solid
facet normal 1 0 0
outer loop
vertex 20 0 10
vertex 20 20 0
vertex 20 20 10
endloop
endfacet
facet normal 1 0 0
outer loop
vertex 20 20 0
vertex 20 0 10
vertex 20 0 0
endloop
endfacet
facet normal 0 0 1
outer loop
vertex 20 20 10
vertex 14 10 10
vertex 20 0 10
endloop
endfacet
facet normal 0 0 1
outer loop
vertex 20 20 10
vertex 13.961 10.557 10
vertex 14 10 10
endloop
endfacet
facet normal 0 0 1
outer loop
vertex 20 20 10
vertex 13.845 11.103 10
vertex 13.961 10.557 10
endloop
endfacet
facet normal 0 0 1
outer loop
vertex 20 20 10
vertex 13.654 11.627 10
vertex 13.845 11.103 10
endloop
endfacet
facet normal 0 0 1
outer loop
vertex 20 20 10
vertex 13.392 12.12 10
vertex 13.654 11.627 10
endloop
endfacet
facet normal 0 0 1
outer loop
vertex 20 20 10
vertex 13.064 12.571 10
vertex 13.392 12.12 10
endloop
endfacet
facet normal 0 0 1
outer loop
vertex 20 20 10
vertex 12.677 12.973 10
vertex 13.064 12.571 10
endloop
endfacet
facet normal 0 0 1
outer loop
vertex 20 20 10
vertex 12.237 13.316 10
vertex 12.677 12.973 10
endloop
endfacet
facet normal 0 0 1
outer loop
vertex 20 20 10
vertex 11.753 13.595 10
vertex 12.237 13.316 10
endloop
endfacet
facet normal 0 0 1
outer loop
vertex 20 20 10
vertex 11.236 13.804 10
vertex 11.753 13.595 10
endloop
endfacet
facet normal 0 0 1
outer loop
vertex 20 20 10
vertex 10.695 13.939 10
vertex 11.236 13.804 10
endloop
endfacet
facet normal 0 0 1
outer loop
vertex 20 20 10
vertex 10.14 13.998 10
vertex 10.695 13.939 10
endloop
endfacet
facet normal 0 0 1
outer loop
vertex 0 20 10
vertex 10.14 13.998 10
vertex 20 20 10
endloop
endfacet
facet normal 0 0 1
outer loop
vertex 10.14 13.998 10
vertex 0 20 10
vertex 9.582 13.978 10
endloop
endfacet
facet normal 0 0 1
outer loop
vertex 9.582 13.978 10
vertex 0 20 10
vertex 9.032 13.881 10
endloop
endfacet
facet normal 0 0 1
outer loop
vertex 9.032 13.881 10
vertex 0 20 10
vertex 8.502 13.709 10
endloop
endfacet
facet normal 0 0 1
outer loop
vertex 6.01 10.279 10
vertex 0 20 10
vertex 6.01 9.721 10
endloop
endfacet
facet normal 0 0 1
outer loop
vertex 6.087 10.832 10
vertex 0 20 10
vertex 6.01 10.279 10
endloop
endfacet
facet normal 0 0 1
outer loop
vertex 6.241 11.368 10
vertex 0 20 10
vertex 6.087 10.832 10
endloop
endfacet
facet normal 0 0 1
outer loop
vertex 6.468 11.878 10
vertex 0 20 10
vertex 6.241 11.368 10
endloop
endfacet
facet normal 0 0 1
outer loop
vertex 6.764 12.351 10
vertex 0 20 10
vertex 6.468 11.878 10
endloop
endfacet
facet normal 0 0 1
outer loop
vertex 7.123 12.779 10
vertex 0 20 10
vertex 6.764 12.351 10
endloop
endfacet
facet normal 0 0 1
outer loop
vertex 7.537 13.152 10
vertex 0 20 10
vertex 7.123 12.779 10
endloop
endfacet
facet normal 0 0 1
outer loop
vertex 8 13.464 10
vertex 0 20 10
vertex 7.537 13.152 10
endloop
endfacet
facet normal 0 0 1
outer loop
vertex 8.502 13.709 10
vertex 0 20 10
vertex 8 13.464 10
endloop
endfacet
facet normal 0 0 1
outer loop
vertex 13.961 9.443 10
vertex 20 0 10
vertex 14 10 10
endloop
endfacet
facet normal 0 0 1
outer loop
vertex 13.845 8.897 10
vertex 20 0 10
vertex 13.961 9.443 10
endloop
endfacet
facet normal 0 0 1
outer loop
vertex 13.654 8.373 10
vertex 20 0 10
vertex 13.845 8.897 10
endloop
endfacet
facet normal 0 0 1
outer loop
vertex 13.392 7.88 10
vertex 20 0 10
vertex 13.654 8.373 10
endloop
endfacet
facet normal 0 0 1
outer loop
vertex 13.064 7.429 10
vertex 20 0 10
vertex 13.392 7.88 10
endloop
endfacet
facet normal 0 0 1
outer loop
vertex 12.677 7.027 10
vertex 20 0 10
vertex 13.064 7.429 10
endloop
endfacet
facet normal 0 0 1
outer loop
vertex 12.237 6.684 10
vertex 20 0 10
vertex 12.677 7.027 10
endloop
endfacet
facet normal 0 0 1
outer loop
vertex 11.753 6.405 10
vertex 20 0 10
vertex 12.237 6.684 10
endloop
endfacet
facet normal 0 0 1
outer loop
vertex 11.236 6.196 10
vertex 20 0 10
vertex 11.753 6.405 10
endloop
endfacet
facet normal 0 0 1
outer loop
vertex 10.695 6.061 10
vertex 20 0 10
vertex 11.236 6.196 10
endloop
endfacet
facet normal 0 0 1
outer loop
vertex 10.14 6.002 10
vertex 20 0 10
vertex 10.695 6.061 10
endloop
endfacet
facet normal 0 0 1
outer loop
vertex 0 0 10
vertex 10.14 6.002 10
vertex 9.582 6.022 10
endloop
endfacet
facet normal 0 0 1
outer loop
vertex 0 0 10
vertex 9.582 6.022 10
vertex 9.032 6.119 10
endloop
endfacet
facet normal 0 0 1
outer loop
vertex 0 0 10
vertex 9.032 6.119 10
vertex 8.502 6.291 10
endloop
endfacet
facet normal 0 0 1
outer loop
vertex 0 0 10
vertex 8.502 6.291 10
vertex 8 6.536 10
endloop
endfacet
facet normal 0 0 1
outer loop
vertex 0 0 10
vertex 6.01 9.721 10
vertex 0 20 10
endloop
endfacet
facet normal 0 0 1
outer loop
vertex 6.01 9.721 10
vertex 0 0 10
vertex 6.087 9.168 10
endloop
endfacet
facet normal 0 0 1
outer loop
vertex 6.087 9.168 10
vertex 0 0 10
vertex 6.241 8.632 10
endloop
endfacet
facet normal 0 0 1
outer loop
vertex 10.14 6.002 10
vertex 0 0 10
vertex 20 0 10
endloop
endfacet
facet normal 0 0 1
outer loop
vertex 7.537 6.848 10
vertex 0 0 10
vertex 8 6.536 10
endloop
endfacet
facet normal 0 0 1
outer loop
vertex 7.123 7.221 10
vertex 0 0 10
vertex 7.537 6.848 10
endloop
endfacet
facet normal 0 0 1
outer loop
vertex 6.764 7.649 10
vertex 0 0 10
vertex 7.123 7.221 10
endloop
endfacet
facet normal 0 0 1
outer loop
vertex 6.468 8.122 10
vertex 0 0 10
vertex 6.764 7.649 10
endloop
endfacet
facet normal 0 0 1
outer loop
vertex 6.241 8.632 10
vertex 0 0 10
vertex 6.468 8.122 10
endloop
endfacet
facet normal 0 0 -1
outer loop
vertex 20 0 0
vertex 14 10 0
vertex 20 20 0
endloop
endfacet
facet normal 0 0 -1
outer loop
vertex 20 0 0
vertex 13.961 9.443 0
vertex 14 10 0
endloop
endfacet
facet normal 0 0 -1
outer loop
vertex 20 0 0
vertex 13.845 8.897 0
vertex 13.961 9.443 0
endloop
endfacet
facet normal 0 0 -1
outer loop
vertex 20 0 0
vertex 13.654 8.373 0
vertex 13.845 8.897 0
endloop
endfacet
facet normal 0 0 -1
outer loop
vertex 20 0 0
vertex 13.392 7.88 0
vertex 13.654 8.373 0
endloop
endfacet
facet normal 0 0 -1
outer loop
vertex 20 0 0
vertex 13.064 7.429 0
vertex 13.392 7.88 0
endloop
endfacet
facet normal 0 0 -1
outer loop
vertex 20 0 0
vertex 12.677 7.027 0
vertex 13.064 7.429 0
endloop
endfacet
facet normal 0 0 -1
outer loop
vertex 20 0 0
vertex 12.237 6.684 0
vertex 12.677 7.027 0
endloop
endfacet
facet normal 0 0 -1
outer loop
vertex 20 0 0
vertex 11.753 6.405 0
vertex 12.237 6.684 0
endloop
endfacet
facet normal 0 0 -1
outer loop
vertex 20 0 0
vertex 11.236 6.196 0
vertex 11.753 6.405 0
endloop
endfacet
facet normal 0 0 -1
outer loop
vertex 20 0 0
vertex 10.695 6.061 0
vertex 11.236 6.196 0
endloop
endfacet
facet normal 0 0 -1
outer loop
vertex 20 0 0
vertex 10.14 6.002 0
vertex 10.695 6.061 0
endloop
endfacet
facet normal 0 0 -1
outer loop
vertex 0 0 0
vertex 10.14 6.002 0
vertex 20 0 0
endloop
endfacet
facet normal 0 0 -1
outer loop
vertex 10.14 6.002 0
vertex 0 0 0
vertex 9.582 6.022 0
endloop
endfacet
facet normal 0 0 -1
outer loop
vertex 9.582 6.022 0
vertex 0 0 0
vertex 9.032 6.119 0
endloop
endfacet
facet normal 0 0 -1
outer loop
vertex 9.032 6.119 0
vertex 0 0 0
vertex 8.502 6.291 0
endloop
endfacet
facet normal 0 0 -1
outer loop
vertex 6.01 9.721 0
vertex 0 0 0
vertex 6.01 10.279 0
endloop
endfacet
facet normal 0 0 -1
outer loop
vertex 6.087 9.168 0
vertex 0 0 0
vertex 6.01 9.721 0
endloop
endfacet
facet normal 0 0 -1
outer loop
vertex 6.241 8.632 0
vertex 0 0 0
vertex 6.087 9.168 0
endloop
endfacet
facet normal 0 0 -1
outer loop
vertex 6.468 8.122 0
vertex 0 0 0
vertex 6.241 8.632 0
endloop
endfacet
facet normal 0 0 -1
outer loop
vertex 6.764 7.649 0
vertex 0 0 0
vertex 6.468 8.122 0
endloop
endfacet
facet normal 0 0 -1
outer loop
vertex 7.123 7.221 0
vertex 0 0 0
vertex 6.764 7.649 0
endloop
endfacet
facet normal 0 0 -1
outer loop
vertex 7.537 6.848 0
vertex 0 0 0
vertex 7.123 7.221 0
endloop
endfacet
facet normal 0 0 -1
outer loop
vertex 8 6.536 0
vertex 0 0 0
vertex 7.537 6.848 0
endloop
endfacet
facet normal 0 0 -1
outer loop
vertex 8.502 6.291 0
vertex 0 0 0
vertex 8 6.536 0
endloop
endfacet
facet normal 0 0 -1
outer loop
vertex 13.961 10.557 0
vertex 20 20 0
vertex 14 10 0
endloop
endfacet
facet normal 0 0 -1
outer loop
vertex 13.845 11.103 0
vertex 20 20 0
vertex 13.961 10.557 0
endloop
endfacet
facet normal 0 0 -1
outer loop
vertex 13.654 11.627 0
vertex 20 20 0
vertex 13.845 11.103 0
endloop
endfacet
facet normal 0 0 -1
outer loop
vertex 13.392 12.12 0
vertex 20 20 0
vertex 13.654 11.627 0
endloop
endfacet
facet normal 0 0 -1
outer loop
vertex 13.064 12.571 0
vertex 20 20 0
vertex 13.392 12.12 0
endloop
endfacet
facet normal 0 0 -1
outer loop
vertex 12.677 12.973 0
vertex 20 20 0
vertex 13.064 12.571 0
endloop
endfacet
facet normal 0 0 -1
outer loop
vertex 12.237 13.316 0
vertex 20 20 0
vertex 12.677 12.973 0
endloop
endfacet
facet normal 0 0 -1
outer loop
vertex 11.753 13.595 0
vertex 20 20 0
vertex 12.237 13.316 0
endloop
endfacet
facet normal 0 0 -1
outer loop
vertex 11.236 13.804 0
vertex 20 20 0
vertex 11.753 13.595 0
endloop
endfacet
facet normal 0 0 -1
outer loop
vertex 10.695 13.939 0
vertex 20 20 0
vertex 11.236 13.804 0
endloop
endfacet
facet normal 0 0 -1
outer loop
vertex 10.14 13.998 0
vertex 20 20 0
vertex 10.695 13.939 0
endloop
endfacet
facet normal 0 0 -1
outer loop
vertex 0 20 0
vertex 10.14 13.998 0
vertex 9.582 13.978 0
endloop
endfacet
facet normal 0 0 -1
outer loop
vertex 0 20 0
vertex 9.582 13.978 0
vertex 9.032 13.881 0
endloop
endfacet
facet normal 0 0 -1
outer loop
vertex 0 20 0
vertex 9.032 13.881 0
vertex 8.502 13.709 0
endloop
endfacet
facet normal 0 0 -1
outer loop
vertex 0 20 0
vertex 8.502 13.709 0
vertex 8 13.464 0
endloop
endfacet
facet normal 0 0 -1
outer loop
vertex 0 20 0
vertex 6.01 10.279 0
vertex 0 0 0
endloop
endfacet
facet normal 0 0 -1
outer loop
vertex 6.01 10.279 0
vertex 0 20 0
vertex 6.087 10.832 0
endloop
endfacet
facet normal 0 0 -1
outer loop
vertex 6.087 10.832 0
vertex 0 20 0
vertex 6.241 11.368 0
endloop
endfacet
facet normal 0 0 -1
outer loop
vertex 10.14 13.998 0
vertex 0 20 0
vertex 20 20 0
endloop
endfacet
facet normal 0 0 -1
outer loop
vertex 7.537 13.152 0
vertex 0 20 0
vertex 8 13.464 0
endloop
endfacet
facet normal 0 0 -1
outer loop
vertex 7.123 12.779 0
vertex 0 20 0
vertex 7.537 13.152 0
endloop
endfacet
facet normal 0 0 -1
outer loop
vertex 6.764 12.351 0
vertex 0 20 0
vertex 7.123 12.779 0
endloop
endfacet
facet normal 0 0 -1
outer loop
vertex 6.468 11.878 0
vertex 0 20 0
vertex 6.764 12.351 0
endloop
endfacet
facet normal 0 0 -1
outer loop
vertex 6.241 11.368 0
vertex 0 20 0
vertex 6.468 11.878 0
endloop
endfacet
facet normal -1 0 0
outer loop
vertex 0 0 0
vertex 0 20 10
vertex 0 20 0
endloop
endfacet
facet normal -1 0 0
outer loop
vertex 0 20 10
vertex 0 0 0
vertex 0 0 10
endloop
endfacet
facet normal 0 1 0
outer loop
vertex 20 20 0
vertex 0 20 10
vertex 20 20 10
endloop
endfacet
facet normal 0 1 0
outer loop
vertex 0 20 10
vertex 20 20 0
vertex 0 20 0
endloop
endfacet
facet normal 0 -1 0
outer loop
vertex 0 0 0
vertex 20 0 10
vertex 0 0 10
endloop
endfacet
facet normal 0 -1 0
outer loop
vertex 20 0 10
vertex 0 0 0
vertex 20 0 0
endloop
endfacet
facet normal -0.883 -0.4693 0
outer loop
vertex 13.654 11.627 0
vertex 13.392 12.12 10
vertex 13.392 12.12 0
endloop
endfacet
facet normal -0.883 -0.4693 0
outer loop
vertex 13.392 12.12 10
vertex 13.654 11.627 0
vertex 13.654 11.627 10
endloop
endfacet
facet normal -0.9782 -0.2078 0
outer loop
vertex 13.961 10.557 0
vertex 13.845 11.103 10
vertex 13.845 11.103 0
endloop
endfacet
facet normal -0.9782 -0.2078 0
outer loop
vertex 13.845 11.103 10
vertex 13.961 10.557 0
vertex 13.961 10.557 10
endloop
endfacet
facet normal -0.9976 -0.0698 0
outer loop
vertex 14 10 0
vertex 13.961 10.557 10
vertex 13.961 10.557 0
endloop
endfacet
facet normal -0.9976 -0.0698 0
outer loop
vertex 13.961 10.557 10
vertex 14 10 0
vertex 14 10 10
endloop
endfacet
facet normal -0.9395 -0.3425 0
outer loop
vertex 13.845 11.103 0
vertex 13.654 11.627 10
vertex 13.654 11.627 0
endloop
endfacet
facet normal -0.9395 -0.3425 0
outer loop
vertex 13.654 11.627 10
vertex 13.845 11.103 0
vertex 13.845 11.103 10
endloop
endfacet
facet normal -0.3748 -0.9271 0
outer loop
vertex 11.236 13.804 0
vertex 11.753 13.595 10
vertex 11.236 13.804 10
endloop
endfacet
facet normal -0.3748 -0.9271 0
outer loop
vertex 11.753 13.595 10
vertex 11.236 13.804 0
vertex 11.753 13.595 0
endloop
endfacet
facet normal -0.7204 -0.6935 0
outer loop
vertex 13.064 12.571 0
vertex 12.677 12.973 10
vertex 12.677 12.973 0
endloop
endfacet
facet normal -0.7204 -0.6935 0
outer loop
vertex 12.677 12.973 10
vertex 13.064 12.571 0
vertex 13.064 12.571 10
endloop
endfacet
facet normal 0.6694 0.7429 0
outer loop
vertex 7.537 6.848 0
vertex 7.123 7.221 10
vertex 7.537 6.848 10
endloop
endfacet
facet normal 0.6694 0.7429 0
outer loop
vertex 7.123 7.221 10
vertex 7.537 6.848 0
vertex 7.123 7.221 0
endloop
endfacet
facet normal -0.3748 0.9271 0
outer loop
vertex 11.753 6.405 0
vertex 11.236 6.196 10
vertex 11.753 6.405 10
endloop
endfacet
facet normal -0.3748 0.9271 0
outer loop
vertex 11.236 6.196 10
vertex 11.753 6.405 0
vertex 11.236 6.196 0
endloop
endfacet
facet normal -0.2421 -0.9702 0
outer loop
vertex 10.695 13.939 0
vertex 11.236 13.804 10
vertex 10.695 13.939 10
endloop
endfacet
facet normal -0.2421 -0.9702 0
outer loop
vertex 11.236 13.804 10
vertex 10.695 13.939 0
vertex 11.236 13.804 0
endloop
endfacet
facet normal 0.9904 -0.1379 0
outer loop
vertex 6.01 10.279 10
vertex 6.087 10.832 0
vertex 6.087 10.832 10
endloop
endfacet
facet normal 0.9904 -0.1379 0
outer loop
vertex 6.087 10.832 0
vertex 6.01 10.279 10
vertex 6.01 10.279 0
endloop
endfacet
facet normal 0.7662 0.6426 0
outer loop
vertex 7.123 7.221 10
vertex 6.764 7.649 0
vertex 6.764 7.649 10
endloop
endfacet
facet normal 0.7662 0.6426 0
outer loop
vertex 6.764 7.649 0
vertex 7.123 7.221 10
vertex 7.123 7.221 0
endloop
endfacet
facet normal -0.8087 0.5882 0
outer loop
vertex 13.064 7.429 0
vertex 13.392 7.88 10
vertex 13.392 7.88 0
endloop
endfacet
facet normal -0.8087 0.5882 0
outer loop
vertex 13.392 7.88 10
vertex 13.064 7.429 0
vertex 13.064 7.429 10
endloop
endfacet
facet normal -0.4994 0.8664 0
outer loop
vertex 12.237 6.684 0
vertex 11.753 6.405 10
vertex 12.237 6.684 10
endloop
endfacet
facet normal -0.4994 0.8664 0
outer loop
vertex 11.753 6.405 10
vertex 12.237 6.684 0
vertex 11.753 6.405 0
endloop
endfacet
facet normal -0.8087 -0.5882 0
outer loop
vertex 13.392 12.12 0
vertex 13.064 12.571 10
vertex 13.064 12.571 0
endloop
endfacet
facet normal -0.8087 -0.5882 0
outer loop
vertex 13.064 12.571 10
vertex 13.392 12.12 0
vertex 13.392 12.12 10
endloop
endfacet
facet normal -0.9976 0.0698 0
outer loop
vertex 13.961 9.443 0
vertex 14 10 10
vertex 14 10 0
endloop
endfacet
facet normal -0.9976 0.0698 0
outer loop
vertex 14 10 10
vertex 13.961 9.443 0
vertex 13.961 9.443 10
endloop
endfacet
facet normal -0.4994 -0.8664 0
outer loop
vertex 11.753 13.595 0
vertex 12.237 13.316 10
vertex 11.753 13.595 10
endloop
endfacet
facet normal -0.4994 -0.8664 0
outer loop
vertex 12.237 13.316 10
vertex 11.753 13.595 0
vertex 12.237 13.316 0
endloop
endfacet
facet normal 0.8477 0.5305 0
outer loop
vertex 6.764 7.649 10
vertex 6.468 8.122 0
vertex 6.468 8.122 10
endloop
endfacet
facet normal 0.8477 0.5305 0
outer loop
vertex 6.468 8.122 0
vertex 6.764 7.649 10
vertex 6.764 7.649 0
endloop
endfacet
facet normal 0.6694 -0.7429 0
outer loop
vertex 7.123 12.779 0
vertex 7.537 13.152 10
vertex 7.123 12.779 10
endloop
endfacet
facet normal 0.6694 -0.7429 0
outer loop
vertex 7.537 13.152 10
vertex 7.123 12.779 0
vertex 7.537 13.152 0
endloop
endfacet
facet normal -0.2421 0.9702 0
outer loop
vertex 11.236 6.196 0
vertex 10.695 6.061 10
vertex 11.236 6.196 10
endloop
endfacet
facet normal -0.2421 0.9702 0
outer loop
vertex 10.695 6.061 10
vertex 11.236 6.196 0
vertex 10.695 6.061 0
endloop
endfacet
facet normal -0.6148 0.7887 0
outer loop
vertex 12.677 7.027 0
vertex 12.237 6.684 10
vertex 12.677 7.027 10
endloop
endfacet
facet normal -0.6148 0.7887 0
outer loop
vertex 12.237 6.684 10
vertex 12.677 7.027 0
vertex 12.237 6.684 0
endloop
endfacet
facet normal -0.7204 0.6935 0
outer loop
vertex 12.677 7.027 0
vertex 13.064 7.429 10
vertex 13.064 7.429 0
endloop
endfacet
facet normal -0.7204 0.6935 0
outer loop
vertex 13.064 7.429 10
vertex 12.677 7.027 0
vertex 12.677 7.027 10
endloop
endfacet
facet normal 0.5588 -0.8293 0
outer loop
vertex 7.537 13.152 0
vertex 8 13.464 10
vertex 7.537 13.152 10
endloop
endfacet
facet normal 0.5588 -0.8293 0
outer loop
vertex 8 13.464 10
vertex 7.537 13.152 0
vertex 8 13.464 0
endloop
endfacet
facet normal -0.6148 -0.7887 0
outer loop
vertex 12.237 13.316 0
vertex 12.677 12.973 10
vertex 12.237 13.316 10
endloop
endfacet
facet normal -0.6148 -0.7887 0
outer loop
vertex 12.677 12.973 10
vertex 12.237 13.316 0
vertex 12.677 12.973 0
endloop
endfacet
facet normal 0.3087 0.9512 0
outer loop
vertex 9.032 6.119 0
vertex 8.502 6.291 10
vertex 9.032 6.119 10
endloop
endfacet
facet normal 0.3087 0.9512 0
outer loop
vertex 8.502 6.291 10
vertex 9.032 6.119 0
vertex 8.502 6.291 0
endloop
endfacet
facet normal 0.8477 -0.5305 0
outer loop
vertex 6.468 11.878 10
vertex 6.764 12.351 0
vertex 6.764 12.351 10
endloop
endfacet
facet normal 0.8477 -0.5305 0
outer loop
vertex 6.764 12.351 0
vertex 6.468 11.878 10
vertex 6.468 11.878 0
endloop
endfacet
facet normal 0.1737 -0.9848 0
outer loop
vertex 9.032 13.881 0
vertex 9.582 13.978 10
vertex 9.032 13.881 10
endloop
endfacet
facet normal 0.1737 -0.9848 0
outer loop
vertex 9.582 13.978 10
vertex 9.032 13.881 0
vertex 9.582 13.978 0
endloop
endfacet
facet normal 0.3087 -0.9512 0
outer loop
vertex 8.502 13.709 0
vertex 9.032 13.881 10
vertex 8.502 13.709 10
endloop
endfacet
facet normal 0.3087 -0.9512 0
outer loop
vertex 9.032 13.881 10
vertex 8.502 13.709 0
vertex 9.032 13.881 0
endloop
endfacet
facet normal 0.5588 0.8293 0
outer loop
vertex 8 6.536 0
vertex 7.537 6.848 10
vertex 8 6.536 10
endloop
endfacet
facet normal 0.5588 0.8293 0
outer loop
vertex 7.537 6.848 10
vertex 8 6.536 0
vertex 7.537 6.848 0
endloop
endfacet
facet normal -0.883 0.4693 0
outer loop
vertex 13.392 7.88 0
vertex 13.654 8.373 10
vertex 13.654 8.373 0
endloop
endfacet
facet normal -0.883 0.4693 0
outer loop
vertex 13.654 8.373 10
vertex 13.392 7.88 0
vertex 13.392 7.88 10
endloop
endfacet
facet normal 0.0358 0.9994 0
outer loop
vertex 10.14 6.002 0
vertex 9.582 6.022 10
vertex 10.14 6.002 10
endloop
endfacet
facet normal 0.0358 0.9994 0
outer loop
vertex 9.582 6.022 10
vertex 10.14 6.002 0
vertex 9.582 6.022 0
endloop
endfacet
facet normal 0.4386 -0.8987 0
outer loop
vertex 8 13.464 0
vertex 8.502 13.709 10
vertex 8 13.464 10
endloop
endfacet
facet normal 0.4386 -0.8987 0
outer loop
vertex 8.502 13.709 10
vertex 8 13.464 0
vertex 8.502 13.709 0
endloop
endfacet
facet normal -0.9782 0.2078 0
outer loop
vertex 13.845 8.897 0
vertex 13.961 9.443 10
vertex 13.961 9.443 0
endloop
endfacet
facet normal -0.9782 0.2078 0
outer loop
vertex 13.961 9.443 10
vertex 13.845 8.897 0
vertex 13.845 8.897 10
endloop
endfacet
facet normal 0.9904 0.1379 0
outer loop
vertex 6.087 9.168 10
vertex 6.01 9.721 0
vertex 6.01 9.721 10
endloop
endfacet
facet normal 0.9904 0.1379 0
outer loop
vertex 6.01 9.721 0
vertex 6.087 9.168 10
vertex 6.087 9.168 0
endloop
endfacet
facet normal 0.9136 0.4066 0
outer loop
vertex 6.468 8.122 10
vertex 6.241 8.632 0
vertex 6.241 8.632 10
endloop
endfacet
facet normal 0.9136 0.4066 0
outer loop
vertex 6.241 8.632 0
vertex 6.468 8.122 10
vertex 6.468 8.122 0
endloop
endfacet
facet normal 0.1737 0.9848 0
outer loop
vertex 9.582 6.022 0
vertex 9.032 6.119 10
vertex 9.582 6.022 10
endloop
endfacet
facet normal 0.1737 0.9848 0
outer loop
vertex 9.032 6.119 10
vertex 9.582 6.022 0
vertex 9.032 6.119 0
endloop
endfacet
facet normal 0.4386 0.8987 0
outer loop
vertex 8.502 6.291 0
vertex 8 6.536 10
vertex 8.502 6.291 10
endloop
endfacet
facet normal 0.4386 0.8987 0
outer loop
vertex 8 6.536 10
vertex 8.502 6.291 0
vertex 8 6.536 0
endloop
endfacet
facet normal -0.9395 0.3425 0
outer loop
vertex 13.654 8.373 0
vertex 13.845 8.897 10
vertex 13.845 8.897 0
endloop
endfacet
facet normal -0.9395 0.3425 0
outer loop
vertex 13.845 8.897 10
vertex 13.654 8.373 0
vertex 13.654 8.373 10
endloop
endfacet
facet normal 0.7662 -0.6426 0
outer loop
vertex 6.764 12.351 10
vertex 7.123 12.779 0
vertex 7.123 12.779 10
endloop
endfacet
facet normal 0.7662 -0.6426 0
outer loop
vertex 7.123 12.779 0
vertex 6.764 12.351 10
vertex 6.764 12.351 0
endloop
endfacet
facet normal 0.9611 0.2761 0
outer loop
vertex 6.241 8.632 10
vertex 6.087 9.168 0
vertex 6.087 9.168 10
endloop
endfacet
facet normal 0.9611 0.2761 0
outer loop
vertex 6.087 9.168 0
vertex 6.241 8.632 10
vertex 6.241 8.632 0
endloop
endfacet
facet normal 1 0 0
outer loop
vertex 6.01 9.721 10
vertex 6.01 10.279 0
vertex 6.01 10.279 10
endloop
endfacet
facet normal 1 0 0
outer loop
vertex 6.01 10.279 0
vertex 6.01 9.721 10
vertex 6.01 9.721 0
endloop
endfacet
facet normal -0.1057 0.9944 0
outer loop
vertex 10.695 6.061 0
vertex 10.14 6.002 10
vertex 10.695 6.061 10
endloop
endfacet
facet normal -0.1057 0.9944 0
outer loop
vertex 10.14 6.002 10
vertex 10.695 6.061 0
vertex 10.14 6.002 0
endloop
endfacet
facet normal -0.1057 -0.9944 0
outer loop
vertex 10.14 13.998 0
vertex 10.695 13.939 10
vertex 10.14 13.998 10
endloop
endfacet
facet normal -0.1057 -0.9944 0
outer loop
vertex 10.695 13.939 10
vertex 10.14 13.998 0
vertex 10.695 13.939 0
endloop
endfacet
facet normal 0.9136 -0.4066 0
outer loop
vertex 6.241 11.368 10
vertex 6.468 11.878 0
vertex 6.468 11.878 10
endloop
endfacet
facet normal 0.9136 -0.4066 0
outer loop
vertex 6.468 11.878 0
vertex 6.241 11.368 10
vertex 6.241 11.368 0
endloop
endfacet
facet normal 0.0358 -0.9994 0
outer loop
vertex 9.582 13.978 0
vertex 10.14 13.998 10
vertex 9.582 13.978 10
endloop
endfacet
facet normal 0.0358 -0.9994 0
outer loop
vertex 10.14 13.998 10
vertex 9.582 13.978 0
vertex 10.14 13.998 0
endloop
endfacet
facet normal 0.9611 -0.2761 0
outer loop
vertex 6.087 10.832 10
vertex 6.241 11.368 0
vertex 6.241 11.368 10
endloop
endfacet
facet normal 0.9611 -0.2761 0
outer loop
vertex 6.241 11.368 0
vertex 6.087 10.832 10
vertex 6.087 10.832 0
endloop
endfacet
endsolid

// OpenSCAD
$fa = 8;
$fs = 0.5;

difference(fillet = 2) {
    cube([20, 20, 10]);
    translate([10, 10, -1]) cylinder(h = 12, r = 4);
}
